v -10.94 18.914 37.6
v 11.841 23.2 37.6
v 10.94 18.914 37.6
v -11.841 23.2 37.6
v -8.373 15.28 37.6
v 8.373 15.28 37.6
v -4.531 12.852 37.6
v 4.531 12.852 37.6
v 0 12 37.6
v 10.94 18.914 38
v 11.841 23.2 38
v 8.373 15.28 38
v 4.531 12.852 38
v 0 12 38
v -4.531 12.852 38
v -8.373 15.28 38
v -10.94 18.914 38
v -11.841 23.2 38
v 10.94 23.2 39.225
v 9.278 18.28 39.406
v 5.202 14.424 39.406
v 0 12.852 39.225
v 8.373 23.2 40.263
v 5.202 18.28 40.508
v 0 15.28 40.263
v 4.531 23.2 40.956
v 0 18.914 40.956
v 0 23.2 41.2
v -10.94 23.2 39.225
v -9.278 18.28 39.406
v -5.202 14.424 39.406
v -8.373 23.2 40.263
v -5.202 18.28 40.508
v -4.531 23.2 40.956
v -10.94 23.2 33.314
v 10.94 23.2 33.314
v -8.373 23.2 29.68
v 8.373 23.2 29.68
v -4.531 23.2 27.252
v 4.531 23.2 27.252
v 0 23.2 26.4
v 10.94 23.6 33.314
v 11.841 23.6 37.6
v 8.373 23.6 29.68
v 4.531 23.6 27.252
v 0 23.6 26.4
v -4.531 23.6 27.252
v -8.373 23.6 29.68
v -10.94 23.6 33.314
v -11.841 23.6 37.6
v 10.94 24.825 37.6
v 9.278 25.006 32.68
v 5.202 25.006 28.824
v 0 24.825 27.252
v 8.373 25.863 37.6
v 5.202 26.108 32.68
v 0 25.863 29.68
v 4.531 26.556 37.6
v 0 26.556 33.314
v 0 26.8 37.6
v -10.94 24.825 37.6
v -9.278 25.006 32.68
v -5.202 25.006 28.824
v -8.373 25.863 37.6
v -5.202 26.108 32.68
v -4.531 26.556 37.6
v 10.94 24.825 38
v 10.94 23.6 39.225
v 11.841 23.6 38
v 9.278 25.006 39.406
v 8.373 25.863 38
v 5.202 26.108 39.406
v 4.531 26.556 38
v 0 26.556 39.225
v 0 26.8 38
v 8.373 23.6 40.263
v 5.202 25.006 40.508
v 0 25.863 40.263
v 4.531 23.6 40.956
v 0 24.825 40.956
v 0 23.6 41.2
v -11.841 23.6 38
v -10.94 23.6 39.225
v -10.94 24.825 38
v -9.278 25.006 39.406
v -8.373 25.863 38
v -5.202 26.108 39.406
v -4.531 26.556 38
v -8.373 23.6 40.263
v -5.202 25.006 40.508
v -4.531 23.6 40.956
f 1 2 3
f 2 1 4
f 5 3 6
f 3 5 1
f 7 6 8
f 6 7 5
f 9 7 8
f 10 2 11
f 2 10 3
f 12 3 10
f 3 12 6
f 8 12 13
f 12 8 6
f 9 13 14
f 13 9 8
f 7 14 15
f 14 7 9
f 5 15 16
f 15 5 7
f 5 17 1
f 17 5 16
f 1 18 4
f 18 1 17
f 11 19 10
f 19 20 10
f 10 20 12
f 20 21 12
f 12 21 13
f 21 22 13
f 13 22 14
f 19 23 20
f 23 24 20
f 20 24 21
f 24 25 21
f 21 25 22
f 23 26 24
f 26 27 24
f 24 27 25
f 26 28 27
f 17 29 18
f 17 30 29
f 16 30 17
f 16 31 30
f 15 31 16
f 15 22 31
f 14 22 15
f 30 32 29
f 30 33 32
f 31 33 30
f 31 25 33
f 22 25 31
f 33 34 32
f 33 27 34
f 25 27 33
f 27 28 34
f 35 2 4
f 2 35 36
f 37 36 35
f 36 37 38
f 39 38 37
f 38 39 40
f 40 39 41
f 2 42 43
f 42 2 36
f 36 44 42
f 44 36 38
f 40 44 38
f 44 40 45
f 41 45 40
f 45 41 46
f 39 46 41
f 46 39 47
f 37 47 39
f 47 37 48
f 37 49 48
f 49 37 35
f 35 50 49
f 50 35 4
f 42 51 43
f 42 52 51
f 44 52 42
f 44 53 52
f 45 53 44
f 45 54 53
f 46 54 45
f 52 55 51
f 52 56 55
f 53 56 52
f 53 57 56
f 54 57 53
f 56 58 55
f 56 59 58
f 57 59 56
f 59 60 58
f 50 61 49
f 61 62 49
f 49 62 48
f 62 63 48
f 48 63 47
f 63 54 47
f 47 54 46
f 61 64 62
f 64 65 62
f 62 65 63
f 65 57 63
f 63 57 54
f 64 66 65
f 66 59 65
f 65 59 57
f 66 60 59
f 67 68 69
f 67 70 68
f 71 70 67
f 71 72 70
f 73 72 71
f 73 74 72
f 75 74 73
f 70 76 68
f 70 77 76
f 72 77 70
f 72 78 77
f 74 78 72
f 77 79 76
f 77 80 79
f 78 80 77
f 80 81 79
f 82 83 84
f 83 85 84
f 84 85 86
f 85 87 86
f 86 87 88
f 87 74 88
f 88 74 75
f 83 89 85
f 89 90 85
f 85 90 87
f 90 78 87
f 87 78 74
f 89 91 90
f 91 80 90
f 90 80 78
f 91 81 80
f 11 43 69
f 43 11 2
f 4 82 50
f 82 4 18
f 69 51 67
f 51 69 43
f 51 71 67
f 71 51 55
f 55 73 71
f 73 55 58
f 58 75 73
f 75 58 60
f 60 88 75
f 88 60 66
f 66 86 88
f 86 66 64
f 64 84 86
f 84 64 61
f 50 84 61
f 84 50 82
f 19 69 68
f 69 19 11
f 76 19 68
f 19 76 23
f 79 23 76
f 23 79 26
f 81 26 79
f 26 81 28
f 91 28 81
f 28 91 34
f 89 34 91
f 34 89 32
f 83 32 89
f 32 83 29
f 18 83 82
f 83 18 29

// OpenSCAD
// file: ../p/1-8sphe.scad
use <../lib.scad>
function ldraw_lib__1_8sphe() = [
// 0 Sphere 0.125
// 0 Name: 1-8sphe.dat
// 0 Author: James Jessiman
// 0 !LDRAW_ORG Primitive UPDATE 2012-03
// 0 !LICENSE Licensed under CC BY 2.0 and CC BY 4.0 : see CAreadme.txt
// 
// 0 BFC CERTIFY CCW
  [0,"BFC","CERTIFY"],
  [0,"BFC","CCW"],
// 
// 0 !HISTORY 2000-08-01 {Axel Poque} fixes to resolve L3P error messages.
// 0 !HISTORY 2000-08-01 {Manfred Moolhuysen} fixes to resolve L3P error messages.
// 0 !HISTORY 2000-09-30 [PTadmin] Official Update 2000-02
// 0 !HISTORY 2002-03-28 [hafhead] Made BFC compliant
// 0 !HISTORY 2002-04-25 [PTadmin] Official Update 2002-02
// 0 !HISTORY 2007-06-22 [PTadmin] Header formatted for Contributor Agreement
// 0 !HISTORY 2008-07-01 [PTadmin] Official Update 2008-01
// 0 !HISTORY 2010-09-12 [MagFors] Changed winding, removed duplicated cond-line, optimized filesize
// 0 !HISTORY 2010-12-31 [PTadmin] Official Update 2010-03
// 0 !HISTORY 2012-07-01 [tcobbs] Replaced with geometry from LDView
// 0 !HISTORY 2012-12-28 [PTadmin] Official Update 2012-03
// 
// 
// 3 16 1 0 0 0.9239 0.3827 0 0.9239 0 0.3827
  [3,16,1,0,0,0.9239,0.3827,0,0.9239,0,0.3827],
// 3 16 0.9239 0.3827 0 0.7836 0.4393 0.4393 0.9239 0 0.3827
  [3,16,0.9239,0.3827,0,0.7836,0.4393,0.4393,0.9239,0,0.3827],
// 3 16 0.9239 0 0.3827 0.7836 0.4393 0.4393 0.7071 0 0.7071
  [3,16,0.9239,0,0.3827,0.7836,0.4393,0.4393,0.7071,0,0.7071],
// 3 16 0.7836 0.4393 0.4393 0.4393 0.4393 0.7836 0.7071 0 0.7071
  [3,16,0.7836,0.4393,0.4393,0.4393,0.4393,0.7836,0.7071,0,0.7071],
// 3 16 0.7071 0 0.7071 0.4393 0.4393 0.7836 0.3827 0 0.9239
  [3,16,0.7071,0,0.7071,0.4393,0.4393,0.7836,0.3827,0,0.9239],
// 3 16 0.4393 0.4393 0.7836 0 0.3827 0.9239 0.3827 0 0.9239
  [3,16,0.4393,0.4393,0.7836,0,0.3827,0.9239,0.3827,0,0.9239],
// 3 16 0.3827 0 0.9239 0 0.3827 0.9239 0 0 1
  [3,16,0.3827,0,0.9239,0,0.3827,0.9239,0,0,1],
// 3 16 0.9239 0.3827 0 0.7071 0.7071 0 0.7836 0.4393 0.4393
  [3,16,0.9239,0.3827,0,0.7071,0.7071,0,0.7836,0.4393,0.4393],
// 3 16 0.7071 0.7071 0 0.4393 0.7836 0.4393 0.7836 0.4393 0.4393
  [3,16,0.7071,0.7071,0,0.4393,0.7836,0.4393,0.7836,0.4393,0.4393],
// 3 16 0.7836 0.4393 0.4393 0.4393 0.7836 0.4393 0.4393 0.4393 0.7836
  [3,16,0.7836,0.4393,0.4393,0.4393,0.7836,0.4393,0.4393,0.4393,0.7836],
// 3 16 0.4393 0.7836 0.4393 0 0.7071 0.7071 0.4393 0.4393 0.7836
  [3,16,0.4393,0.7836,0.4393,0,0.7071,0.7071,0.4393,0.4393,0.7836],
// 3 16 0.4393 0.4393 0.7836 0 0.7071 0.7071 0 0.3827 0.9239
  [3,16,0.4393,0.4393,0.7836,0,0.7071,0.7071,0,0.3827,0.9239],
// 3 16 0.7071 0.7071 0 0.3827 0.9239 0 0.4393 0.7836 0.4393
  [3,16,0.7071,0.7071,0,0.3827,0.9239,0,0.4393,0.7836,0.4393],
// 3 16 0.3827 0.9239 0 0 0.9239 0.3827 0.4393 0.7836 0.4393
  [3,16,0.3827,0.9239,0,0,0.9239,0.3827,0.4393,0.7836,0.4393],
// 3 16 0.4393 0.7836 0.4393 0 0.9239 0.3827 0 0.7071 0.7071
  [3,16,0.4393,0.7836,0.4393,0,0.9239,0.3827,0,0.7071,0.7071],
// 3 16 0.3827 0.9239 0 0 1 0 0 0.9239 0.3827
  [3,16,0.3827,0.9239,0,0,1,0,0,0.9239,0.3827],
// 
// 5 24 1 0 0 0.9239 0.3827 0 1 0 -0.1 0.9239 0 0.3827
  [5,24,1,0,0,0.9239,0.3827,0,1,0,-0.1,0.9239,0,0.3827],
// 5 24 0.9239 0.3827 0 0.9239 0 0.3827 1 0 0 0.7836 0.4393 0.4393
  [5,24,0.9239,0.3827,0,0.9239,0,0.3827,1,0,0,0.7836,0.4393,0.4393],
// 5 24 1 0 0 0.9239 0 0.3827 0.9239 0.3827 0 1 -0.1 0
  [5,24,1,0,0,0.9239,0,0.3827,0.9239,0.3827,0,1,-0.1,0],
// 5 24 0.9239 0 0.3827 0.7836 0.4393 0.4393 0.9239 0.3827 0 0.7071 0 0.7071
  [5,24,0.9239,0,0.3827,0.7836,0.4393,0.4393,0.9239,0.3827,0,0.7071,0,0.7071],
// 5 24 0.7836 0.4393 0.4393 0.7071 0 0.7071 0.9239 0 0.3827 0.4393 0.4393 0.7836
  [5,24,0.7836,0.4393,0.4393,0.7071,0,0.7071,0.9239,0,0.3827,0.4393,0.4393,0.7836],
// 5 24 0.9239 0 0.3827 0.7071 0 0.7071 0.7836 0.4393 0.4393 0.9239 -0.1 0.3827
  [5,24,0.9239,0,0.3827,0.7071,0,0.7071,0.7836,0.4393,0.4393,0.9239,-0.1,0.3827],
// 5 24 0.7071 0 0.7071 0.4393 0.4393 0.7836 0.7836 0.4393 0.4393 0.3827 0 0.9239
  [5,24,0.7071,0,0.7071,0.4393,0.4393,0.7836,0.7836,0.4393,0.4393,0.3827,0,0.9239],
// 5 24 0.4393 0.4393 0.7836 0.3827 0 0.9239 0.7071 0 0.7071 0 0.3827 0.9239
  [5,24,0.4393,0.4393,0.7836,0.3827,0,0.9239,0.7071,0,0.7071,0,0.3827,0.9239],
// 5 24 0.7071 0 0.7071 0.3827 0 0.9239 0.4393 0.4393 0.7836 0.7071 -0.1 0.7071
  [5,24,0.7071,0,0.7071,0.3827,0,0.9239,0.4393,0.4393,0.7836,0.7071,-0.1,0.7071],
// 5 24 0.3827 0 0.9239 0 0.3827 0.9239 0.4393 0.4393 0.7836 0 0 1
  [5,24,0.3827,0,0.9239,0,0.3827,0.9239,0.4393,0.4393,0.7836,0,0,1],
// 5 24 0 0.3827 0.9239 0 0 1 0.3827 0 0.9239 -0.1 0.3827 0.9239
  [5,24,0,0.3827,0.9239,0,0,1,0.3827,0,0.9239,-0.1,0.3827,0.9239],
// 5 24 0.3827 0 0.9239 0 0 1 0 0.3827 0.9239 0.3827 -0.1 0.9239
  [5,24,0.3827,0,0.9239,0,0,1,0,0.3827,0.9239,0.3827,-0.1,0.9239],
// 5 24 0.9239 0.3827 0 0.7071 0.7071 0 0.9239 0.3827 -0.1 0.7836 0.4393 0.4393
  [5,24,0.9239,0.3827,0,0.7071,0.7071,0,0.9239,0.3827,-0.1,0.7836,0.4393,0.4393],
// 5 24 0.7071 0.7071 0 0.7836 0.4393 0.4393 0.9239 0.3827 0 0.4393 0.7836 0.4393
  [5,24,0.7071,0.7071,0,0.7836,0.4393,0.4393,0.9239,0.3827,0,0.4393,0.7836,0.4393],
// 5 24 0.9239 0.3827 0 0.7836 0.4393 0.4393 0.7071 0.7071 0 0.9239 0 0.3827
  [5,24,0.9239,0.3827,0,0.7836,0.4393,0.4393,0.7071,0.7071,0,0.9239,0,0.3827],
// 5 24 0.7836 0.4393 0.4393 0.4393 0.7836 0.4393 0.7071 0.7071 0 0.4393 0.4393 0.7836
  [5,24,0.7836,0.4393,0.4393,0.4393,0.7836,0.4393,0.7071,0.7071,0,0.4393,0.4393,0.7836],
// 5 24 0.4393 0.7836 0.4393 0.4393 0.4393 0.7836 0.7836 0.4393 0.4393 0 0.7071 0.7071
  [5,24,0.4393,0.7836,0.4393,0.4393,0.4393,0.7836,0.7836,0.4393,0.4393,0,0.7071,0.7071],
// 5 24 0.7836 0.4393 0.4393 0.4393 0.4393 0.7836 0.4393 0.7836 0.4393 0.7071 0 0.7071
  [5,24,0.7836,0.4393,0.4393,0.4393,0.4393,0.7836,0.4393,0.7836,0.4393,0.7071,0,0.7071],
// 5 24 0.4393 0.4393 0.7836 0 0.7071 0.7071 0.4393 0.7836 0.4393 0 0.3827 0.9239
  [5,24,0.4393,0.4393,0.7836,0,0.7071,0.7071,0.4393,0.7836,0.4393,0,0.3827,0.9239],
// 5 24 0 0.7071 0.7071 0 0.3827 0.9239 0.4393 0.4393 0.7836 -0.1 0.7071 0.7071
  [5,24,0,0.7071,0.7071,0,0.3827,0.9239,0.4393,0.4393,0.7836,-0.1,0.7071,0.7071],
// 5 24 0.4393 0.4393 0.7836 0 0.3827 0.9239 0 0.7071 0.7071 0.3827 0 0.9239
  [5,24,0.4393,0.4393,0.7836,0,0.3827,0.9239,0,0.7071,0.7071,0.3827,0,0.9239],
// 5 24 0.7071 0.7071 0 0.3827 0.9239 0 0.7071 0.7071 -0.1 0.4393 0.7836 0.4393
  [5,24,0.7071,0.7071,0,0.3827,0.9239,0,0.7071,0.7071,-0.1,0.4393,0.7836,0.4393],
// 5 24 0.3827 0.9239 0 0.4393 0.7836 0.4393 0.7071 0.7071 0 0 0.9239 0.3827
  [5,24,0.3827,0.9239,0,0.4393,0.7836,0.4393,0.7071,0.7071,0,0,0.9239,0.3827],
// 5 24 0.7071 0.7071 0 0.4393 0.7836 0.4393 0.3827 0.9239 0 0.7836 0.4393 0.4393
  [5,24,0.7071,0.7071,0,0.4393,0.7836,0.4393,0.3827,0.9239,0,0.7836,0.4393,0.4393],
// 5 24 0.4393 0.7836 0.4393 0 0.9239 0.3827 0.3827 0.9239 0 0 0.7071 0.7071
  [5,24,0.4393,0.7836,0.4393,0,0.9239,0.3827,0.3827,0.9239,0,0,0.7071,0.7071],
// 5 24 0 0.9239 0.3827 0 0.7071 0.7071 0.4393 0.7836 0.4393 -0.1 0.9239 0.3827
  [5,24,0,0.9239,0.3827,0,0.7071,0.7071,0.4393,0.7836,0.4393,-0.1,0.9239,0.3827],
// 5 24 0.4393 0.7836 0.4393 0 0.7071 0.7071 0 0.9239 0.3827 0.4393 0.4393 0.7836
  [5,24,0.4393,0.7836,0.4393,0,0.7071,0.7071,0,0.9239,0.3827,0.4393,0.4393,0.7836],
// 5 24 0.3827 0.9239 0 0 1 0 0.3827 0.9239 -0.1 0 0.9239 0.3827
  [5,24,0.3827,0.9239,0,0,1,0,0.3827,0.9239,-0.1,0,0.9239,0.3827],
// 5 24 0 1 0 0 0.9239 0.3827 0.3827 0.9239 0 -0.1 1 0
  [5,24,0,1,0,0,0.9239,0.3827,0.3827,0.9239,0,-0.1,1,0],
// 5 24 0.3827 0.9239 0 0 0.9239 0.3827 0 1 0 0.4393 0.7836 0.4393
  [5,24,0.3827,0.9239,0,0,0.9239,0.3827,0,1,0,0.4393,0.7836,0.4393],
];
module ldraw_lib__1_8sphe(step=0, col=false, unit=2/5, alt=false, line=0.2, solid=!$preview)
    makepoly(ldraw_lib__1_8sphe(), step=step, col=col, unit=unit, alt=alt, line=line, solid=solid);
ldraw_lib__1_8sphe(line=0.2);
// file: ../p/2-8sphe.scad
use <../lib.scad>
use <1-8sphe.scad>
function ldraw_lib__2_8sphe() = [
// 0 Sphere 0.25
// 0 Name: 2-8sphe.dat
// 0 Author: James Jessiman
// 0 !LDRAW_ORG Primitive UPDATE 2003-02
// 0 !LICENSE Licensed under CC BY 2.0 and CC BY 4.0 : see CAreadme.txt
// 
// 0 BFC CERTIFY CCW
  [0,"BFC","CERTIFY"],
  [0,"BFC","CCW"],
// 
// 0 !HISTORY 2002-08-31 [izanette] Modified with WINDZ for BFC compliance
// 0 !HISTORY 2003-08-01 [PTadmin] Official Update 2003-02
// 0 !HISTORY 2007-06-24 [PTadmin] Header formatted for Contributor Agreement
// 0 !HISTORY 2008-07-01 [PTadmin] Official Update 2008-01
// 
// 
// 1 16 0 0 0 1 0 0 0 1 0 0 0 1 1-8sphe.dat
  [1,16,0,0,0,1,0,0,0,1,0,0,0,1, ldraw_lib__1_8sphe()],
// 1 16 0 0 0 -1 0 0 0 1 0 0 0 1 1-8sphe.dat
  [1,16,0,0,0,-1,0,0,0,1,0,0,0,1, ldraw_lib__1_8sphe()],
// 0
// 
];
module ldraw_lib__2_8sphe(step=0, col=false, unit=2/5, alt=false, line=0.2, solid=!$preview)
    makepoly(ldraw_lib__2_8sphe(), step=step, col=col, unit=unit, alt=alt, line=line, solid=solid);
ldraw_lib__2_8sphe(line=0.2);
// file: ../p/2-4edge.scad
use <../lib.scad>
function ldraw_lib__2_4edge() = [
// 0 Circle 0.5
// 0 Name: 2-4edge.dat
// 0 Author: James Jessiman
// 0 !LDRAW_ORG Primitive UPDATE 2017-01
// 0 !LICENSE Licensed under CC BY 2.0 and CC BY 4.0 : see CAreadme.txt
// 
// 0 BFC CERTIFY CCW
  [0,"BFC","CERTIFY"],
  [0,"BFC","CCW"],
// 
// 0 !HISTORY 2007-06-24 [PTadmin] Header formatted for Contributor Agreement
// 0 !HISTORY 2008-07-01 [PTadmin] Official Update 2008-01
// 0 !HISTORY 2017-01-15 [Steffen] BFCed
// 0 !HISTORY 2017-12-30 [PTadmin] Official Update 2017-01
// 
// 
// 2 24 1 0 0 0.9239 0 0.3827
  [2,24,1,0,0,0.9239,0,0.3827],
// 2 24 0.9239 0 0.3827 0.7071 0 0.7071
  [2,24,0.9239,0,0.3827,0.7071,0,0.7071],
// 2 24 0.7071 0 0.7071 0.3827 0 0.9239
  [2,24,0.7071,0,0.7071,0.3827,0,0.9239],
// 2 24 0.3827 0 0.9239 0 0 1
  [2,24,0.3827,0,0.9239,0,0,1],
// 2 24 0 0 1 -0.3827 0 0.9239
  [2,24,0,0,1,-0.3827,0,0.9239],
// 2 24 -0.3827 0 0.9239 -0.7071 0 0.7071
  [2,24,-0.3827,0,0.9239,-0.7071,0,0.7071],
// 2 24 -0.7071 0 0.7071 -0.9239 0 0.3827
  [2,24,-0.7071,0,0.7071,-0.9239,0,0.3827],
// 2 24 -0.9239 0 0.3827 -1 0 0
  [2,24,-0.9239,0,0.3827,-1,0,0],
];
module ldraw_lib__2_4edge(step=0, col=false, unit=2/5, alt=false, line=0.2, solid=!$preview)
    makepoly(ldraw_lib__2_4edge(), step=step, col=col, unit=unit, alt=alt, line=line, solid=solid);
ldraw_lib__2_4edge(line=0.2);
// file: ../p/2-4cyli.scad
use <../lib.scad>
function ldraw_lib__2_4cyli() = [
// 0 Cylinder 0.5
// 0 Name: 2-4cyli.dat
// 0 Author: James Jessiman
// 0 !LDRAW_ORG Primitive UPDATE 2005-01
// 0 !LICENSE Licensed under CC BY 2.0 and CC BY 4.0 : see CAreadme.txt
// 
// 0 BFC CERTIFY CCW
  [0,"BFC","CERTIFY"],
  [0,"BFC","CCW"],
// 
// 0 !HISTORY 2002-03-23 [sbliss] Added BFC statement; compacted code
// 0 !HISTORY 2002-04-25 [PTadmin] Official Update 2002-02
// 0 !HISTORY 2004-12-11 [nielsk] Recreated using Primitive Generator, Edge lines fixed, BFC changed to CCW
// 0 !HISTORY 2005-12-28 [PTadmin] Official Update 2005-01
// 0 !HISTORY 2007-06-24 [PTadmin] Header formatted for Contributor Agreement
// 0 !HISTORY 2008-07-01 [PTadmin] Official Update 2008-01
// 
// 
// 4 16 .9239 1 .3827 .9239 0 .3827 1 0 0 1 1 0
  [4,16,.9239,1,.3827,.9239,0,.3827,1,0,0,1,1,0],
// 4 16 .7071 1 .7071 .7071 0 .7071 .9239 0 .3827 .9239 1 .3827
  [4,16,.7071,1,.7071,.7071,0,.7071,.9239,0,.3827,.9239,1,.3827],
// 4 16 .3827 1 .9239 .3827 0 .9239 .7071 0 .7071 .7071 1 .7071
  [4,16,.3827,1,.9239,.3827,0,.9239,.7071,0,.7071,.7071,1,.7071],
// 4 16 0 1 1 0 0 1 .3827 0 .9239 .3827 1 .9239
  [4,16,0,1,1,0,0,1,.3827,0,.9239,.3827,1,.9239],
// 4 16 -.3827 1 .9239 -.3827 0 .9239 0 0 1 0 1 1
  [4,16,-.3827,1,.9239,-.3827,0,.9239,0,0,1,0,1,1],
// 4 16 -.7071 1 .7071 -.7071 0 .7071 -.3827 0 .9239 -.3827 1 .9239
  [4,16,-.7071,1,.7071,-.7071,0,.7071,-.3827,0,.9239,-.3827,1,.9239],
// 4 16 -.9239 1 .3827 -.9239 0 .3827 -.7071 0 .7071 -.7071 1 .7071
  [4,16,-.9239,1,.3827,-.9239,0,.3827,-.7071,0,.7071,-.7071,1,.7071],
// 4 16 -1 1 0 -1 0 0 -.9239 0 .3827 -.9239 1 .3827
  [4,16,-1,1,0,-1,0,0,-.9239,0,.3827,-.9239,1,.3827],
// 5 24 1 1 0 1 0 0 1 1 -.4142 .9239 1 .3827
  [5,24,1,1,0,1,0,0,1,1,-.4142,.9239,1,.3827],
// 5 24 .9239 1 .3827 .9239 0 .3827 1 1 0 .7071 1 .7071
  [5,24,.9239,1,.3827,.9239,0,.3827,1,1,0,.7071,1,.7071],
// 5 24 .7071 1 .7071 .7071 0 .7071 .9239 1 .3827 .3827 1 .9239
  [5,24,.7071,1,.7071,.7071,0,.7071,.9239,1,.3827,.3827,1,.9239],
// 5 24 .3827 1 .9239 .3827 0 .9239 .7071 1 .7071 0 1 1
  [5,24,.3827,1,.9239,.3827,0,.9239,.7071,1,.7071,0,1,1],
// 5 24 0 1 1 0 0 1 .3827 1 .9239 -.3827 1 .9239
  [5,24,0,1,1,0,0,1,.3827,1,.9239,-.3827,1,.9239],
// 5 24 -.3827 1 .9239 -.3827 0 .9239 0 1 1 -.7071 1 .7071
  [5,24,-.3827,1,.9239,-.3827,0,.9239,0,1,1,-.7071,1,.7071],
// 5 24 -.7071 1 .7071 -.7071 0 .7071 -.3827 1 .9239 -.9239 1 .3827
  [5,24,-.7071,1,.7071,-.7071,0,.7071,-.3827,1,.9239,-.9239,1,.3827],
// 5 24 -.9239 1 .3827 -.9239 0 .3827 -.7071 1 .7071 -1 1 0
  [5,24,-.9239,1,.3827,-.9239,0,.3827,-.7071,1,.7071,-1,1,0],
// 5 24 -1 1 0 -1 0 0 -.9239 1 .3827 -1 1 -.4142
  [5,24,-1,1,0,-1,0,0,-.9239,1,.3827,-1,1,-.4142],
// 0
];
module ldraw_lib__2_4cyli(step=0, col=false, unit=2/5, alt=false, line=0.2, solid=!$preview)
    makepoly(ldraw_lib__2_4cyli(), step=step, col=col, unit=unit, alt=alt, line=line, solid=solid);
ldraw_lib__2_4cyli(line=0.2);
// file: ../p/2-4chrd.scad
use <../lib.scad>
function ldraw_lib__2_4chrd() = [
// 0 Chord 0.5
// 0 Name: 2-4chrd.dat
// 0 Author: Philippe Hurbain [Philo]
// 0 !LDRAW_ORG Primitive UPDATE 2014-01
// 0 !LICENSE Licensed under CC BY 2.0 and CC BY 4.0 : see CAreadme.txt
// 
// 0 BFC CERTIFY CCW
  [0,"BFC","CERTIFY"],
  [0,"BFC","CCW"],
// 
// 0 !HISTORY 2014-06-21 [PTadmin] Official Update 2014-01
// 
// 
// 4 16 0.9239 0 0.3827 -0.9239 0 0.3827 -1 0 0 1 0 0
  [4,16,0.9239,0,0.3827,-0.9239,0,0.3827,-1,0,0,1,0,0],
// 4 16 0.7071 0 0.7071 -0.7071 0 0.7071 -0.9239 0 0.3827 0.9239 0 0.3827
  [4,16,0.7071,0,0.7071,-0.7071,0,0.7071,-0.9239,0,0.3827,0.9239,0,0.3827],
// 4 16 0.3827 0 0.9239 -0.3827 0 0.9239 -0.7071 0 0.7071 0.7071 0 0.7071
  [4,16,0.3827,0,0.9239,-0.3827,0,0.9239,-0.7071,0,0.7071,0.7071,0,0.7071],
// 3 16 0 0 1 -0.3827 0 0.9239 0.3827 0 0.9239
  [3,16,0,0,1,-0.3827,0,0.9239,0.3827,0,0.9239],
];
module ldraw_lib__2_4chrd(step=0, col=false, unit=2/5, alt=false, line=0.2, solid=!$preview)
    makepoly(ldraw_lib__2_4chrd(), step=step, col=col, unit=unit, alt=alt, line=line, solid=solid);
ldraw_lib__2_4chrd(line=0.2);
// main file
use <../lib.scad>
use <../p/2-4chrd.scad>
use <../p/2-4cyli.scad>
use <../p/2-4edge.scad>
use <../p/2-8sphe.scad>
function ldraw_lib__u9273() = [
// 0 ~Electric Motor Unit  6 x 18 x  4 - IR Lens
// 0 Name: u9273.dat
// 0 Author: Chris Dee [cwdee]
// 0 !LDRAW_ORG Part UPDATE 2022-03
// 0 !LICENSE Licensed under CC BY 2.0 and CC BY 4.0 : see CAreadme.txt
// 
// 0 BFC CERTIFY CCW
  [0,"BFC","CERTIFY"],
  [0,"BFC","CCW"],
// 
// 0 !HISTORY 2013-08-15 [Steffen] BFCed
// 0 !HISTORY 2013-09-02 [theJudeAbides] Fixed bad junctions, added missing cond-lines
// 0 !HISTORY 2019-08-28 [cwdee] Filled back
// 0 !HISTORY 2022-03-11 [Holly-Wood] Rewrote from scratch
// 0 !HISTORY 2022-05-07 [PTadmin] Official Update 2022-03
// 
// 
// 1 16 0 -94 58 29.602 0 0 0 -1 0 0 0 -28 2-4chrd.dat
  [1,16,0,-94,58,29.602,0,0,0,-1,0,0,0,-28, ldraw_lib__2_4chrd()],
// 1 16 0 -94 58 29.602 0 0 0 1 0 0 0 -28 2-4edge.dat
  [1,16,0,-94,58,29.602,0,0,0,1,0,0,0,-28, ldraw_lib__2_4edge()],
// 1 16 0 -95 58 29.602 0 0 0 1 0 0 0 -28 2-4cyli.dat
  [1,16,0,-95,58,29.602,0,0,0,1,0,0,0,-28, ldraw_lib__2_4cyli()],
// 1 16 0 -95 58 29.602 0 0 0 -8 0 0 0 -28 2-8sphe.dat
  [1,16,0,-95,58,29.602,0,0,0,-8,0,0,0,-28, ldraw_lib__2_8sphe()],
// 1 16 0 -94 58 29.602 0 0 0 0 28 0 1 0 2-4chrd.dat
  [1,16,0,-94,58,29.602,0,0,0,0,28,0,1,0, ldraw_lib__2_4chrd()],
// 1 16 0 -94 58 29.602 0 0 0 0 28 0 -1 0 2-4edge.dat
  [1,16,0,-94,58,29.602,0,0,0,0,28,0,-1,0, ldraw_lib__2_4edge()],
// 1 16 0 -94 59 29.602 0 0 0 0 28 0 -1 0 2-4cyli.dat
  [1,16,0,-94,59,29.602,0,0,0,0,28,0,-1,0, ldraw_lib__2_4cyli()],
// 1 16 0 -94 59 29.602 0 0 0 0 28 0 8 0 2-8sphe.dat
  [1,16,0,-94,59,29.602,0,0,0,0,28,0,8,0, ldraw_lib__2_8sphe()],
// 1 16 0 -95 59 29.602 0 0 0 -8 0 0 0 8 2-8sphe.dat
  [1,16,0,-95,59,29.602,0,0,0,-8,0,0,0,8, ldraw_lib__2_8sphe()],
// 4 16 29.602 -95 58 29.602 -94 58 29.602 -94 59 29.602 -95 59
  [4,16,29.602,-95,58,29.602,-94,58,29.602,-94,59,29.602,-95,59],
// 4 16 -29.602 -95 58 -29.602 -95 59 -29.602 -94 59 -29.602 -94 58
  [4,16,-29.602,-95,58,-29.602,-95,59,-29.602,-94,59,-29.602,-94,58],
// 2 24 -29.602 -94 58 29.602 -94 58
  [2,24,-29.602,-94,58,29.602,-94,58],
// 1 16 0 -95 59 29.602 0 0 0 1 0 0 0 8 2-4cyli.dat
  [1,16,0,-95,59,29.602,0,0,0,1,0,0,0,8, ldraw_lib__2_4cyli()],
// 1 16 0 -95 59 29.602 0 0 0 0 -8 0 -1 0 2-4cyli.dat
  [1,16,0,-95,59,29.602,0,0,0,0,-8,0,-1,0, ldraw_lib__2_4cyli()],
];
module ldraw_lib__u9273(step=0, col=false, unit=2/5, alt=false, line=0.2, solid=!$preview)
    makepoly(ldraw_lib__u9273(), step=step, col=col, unit=unit, alt=alt, line=line, solid=solid);
ldraw_lib__u9273(line=0.2);
